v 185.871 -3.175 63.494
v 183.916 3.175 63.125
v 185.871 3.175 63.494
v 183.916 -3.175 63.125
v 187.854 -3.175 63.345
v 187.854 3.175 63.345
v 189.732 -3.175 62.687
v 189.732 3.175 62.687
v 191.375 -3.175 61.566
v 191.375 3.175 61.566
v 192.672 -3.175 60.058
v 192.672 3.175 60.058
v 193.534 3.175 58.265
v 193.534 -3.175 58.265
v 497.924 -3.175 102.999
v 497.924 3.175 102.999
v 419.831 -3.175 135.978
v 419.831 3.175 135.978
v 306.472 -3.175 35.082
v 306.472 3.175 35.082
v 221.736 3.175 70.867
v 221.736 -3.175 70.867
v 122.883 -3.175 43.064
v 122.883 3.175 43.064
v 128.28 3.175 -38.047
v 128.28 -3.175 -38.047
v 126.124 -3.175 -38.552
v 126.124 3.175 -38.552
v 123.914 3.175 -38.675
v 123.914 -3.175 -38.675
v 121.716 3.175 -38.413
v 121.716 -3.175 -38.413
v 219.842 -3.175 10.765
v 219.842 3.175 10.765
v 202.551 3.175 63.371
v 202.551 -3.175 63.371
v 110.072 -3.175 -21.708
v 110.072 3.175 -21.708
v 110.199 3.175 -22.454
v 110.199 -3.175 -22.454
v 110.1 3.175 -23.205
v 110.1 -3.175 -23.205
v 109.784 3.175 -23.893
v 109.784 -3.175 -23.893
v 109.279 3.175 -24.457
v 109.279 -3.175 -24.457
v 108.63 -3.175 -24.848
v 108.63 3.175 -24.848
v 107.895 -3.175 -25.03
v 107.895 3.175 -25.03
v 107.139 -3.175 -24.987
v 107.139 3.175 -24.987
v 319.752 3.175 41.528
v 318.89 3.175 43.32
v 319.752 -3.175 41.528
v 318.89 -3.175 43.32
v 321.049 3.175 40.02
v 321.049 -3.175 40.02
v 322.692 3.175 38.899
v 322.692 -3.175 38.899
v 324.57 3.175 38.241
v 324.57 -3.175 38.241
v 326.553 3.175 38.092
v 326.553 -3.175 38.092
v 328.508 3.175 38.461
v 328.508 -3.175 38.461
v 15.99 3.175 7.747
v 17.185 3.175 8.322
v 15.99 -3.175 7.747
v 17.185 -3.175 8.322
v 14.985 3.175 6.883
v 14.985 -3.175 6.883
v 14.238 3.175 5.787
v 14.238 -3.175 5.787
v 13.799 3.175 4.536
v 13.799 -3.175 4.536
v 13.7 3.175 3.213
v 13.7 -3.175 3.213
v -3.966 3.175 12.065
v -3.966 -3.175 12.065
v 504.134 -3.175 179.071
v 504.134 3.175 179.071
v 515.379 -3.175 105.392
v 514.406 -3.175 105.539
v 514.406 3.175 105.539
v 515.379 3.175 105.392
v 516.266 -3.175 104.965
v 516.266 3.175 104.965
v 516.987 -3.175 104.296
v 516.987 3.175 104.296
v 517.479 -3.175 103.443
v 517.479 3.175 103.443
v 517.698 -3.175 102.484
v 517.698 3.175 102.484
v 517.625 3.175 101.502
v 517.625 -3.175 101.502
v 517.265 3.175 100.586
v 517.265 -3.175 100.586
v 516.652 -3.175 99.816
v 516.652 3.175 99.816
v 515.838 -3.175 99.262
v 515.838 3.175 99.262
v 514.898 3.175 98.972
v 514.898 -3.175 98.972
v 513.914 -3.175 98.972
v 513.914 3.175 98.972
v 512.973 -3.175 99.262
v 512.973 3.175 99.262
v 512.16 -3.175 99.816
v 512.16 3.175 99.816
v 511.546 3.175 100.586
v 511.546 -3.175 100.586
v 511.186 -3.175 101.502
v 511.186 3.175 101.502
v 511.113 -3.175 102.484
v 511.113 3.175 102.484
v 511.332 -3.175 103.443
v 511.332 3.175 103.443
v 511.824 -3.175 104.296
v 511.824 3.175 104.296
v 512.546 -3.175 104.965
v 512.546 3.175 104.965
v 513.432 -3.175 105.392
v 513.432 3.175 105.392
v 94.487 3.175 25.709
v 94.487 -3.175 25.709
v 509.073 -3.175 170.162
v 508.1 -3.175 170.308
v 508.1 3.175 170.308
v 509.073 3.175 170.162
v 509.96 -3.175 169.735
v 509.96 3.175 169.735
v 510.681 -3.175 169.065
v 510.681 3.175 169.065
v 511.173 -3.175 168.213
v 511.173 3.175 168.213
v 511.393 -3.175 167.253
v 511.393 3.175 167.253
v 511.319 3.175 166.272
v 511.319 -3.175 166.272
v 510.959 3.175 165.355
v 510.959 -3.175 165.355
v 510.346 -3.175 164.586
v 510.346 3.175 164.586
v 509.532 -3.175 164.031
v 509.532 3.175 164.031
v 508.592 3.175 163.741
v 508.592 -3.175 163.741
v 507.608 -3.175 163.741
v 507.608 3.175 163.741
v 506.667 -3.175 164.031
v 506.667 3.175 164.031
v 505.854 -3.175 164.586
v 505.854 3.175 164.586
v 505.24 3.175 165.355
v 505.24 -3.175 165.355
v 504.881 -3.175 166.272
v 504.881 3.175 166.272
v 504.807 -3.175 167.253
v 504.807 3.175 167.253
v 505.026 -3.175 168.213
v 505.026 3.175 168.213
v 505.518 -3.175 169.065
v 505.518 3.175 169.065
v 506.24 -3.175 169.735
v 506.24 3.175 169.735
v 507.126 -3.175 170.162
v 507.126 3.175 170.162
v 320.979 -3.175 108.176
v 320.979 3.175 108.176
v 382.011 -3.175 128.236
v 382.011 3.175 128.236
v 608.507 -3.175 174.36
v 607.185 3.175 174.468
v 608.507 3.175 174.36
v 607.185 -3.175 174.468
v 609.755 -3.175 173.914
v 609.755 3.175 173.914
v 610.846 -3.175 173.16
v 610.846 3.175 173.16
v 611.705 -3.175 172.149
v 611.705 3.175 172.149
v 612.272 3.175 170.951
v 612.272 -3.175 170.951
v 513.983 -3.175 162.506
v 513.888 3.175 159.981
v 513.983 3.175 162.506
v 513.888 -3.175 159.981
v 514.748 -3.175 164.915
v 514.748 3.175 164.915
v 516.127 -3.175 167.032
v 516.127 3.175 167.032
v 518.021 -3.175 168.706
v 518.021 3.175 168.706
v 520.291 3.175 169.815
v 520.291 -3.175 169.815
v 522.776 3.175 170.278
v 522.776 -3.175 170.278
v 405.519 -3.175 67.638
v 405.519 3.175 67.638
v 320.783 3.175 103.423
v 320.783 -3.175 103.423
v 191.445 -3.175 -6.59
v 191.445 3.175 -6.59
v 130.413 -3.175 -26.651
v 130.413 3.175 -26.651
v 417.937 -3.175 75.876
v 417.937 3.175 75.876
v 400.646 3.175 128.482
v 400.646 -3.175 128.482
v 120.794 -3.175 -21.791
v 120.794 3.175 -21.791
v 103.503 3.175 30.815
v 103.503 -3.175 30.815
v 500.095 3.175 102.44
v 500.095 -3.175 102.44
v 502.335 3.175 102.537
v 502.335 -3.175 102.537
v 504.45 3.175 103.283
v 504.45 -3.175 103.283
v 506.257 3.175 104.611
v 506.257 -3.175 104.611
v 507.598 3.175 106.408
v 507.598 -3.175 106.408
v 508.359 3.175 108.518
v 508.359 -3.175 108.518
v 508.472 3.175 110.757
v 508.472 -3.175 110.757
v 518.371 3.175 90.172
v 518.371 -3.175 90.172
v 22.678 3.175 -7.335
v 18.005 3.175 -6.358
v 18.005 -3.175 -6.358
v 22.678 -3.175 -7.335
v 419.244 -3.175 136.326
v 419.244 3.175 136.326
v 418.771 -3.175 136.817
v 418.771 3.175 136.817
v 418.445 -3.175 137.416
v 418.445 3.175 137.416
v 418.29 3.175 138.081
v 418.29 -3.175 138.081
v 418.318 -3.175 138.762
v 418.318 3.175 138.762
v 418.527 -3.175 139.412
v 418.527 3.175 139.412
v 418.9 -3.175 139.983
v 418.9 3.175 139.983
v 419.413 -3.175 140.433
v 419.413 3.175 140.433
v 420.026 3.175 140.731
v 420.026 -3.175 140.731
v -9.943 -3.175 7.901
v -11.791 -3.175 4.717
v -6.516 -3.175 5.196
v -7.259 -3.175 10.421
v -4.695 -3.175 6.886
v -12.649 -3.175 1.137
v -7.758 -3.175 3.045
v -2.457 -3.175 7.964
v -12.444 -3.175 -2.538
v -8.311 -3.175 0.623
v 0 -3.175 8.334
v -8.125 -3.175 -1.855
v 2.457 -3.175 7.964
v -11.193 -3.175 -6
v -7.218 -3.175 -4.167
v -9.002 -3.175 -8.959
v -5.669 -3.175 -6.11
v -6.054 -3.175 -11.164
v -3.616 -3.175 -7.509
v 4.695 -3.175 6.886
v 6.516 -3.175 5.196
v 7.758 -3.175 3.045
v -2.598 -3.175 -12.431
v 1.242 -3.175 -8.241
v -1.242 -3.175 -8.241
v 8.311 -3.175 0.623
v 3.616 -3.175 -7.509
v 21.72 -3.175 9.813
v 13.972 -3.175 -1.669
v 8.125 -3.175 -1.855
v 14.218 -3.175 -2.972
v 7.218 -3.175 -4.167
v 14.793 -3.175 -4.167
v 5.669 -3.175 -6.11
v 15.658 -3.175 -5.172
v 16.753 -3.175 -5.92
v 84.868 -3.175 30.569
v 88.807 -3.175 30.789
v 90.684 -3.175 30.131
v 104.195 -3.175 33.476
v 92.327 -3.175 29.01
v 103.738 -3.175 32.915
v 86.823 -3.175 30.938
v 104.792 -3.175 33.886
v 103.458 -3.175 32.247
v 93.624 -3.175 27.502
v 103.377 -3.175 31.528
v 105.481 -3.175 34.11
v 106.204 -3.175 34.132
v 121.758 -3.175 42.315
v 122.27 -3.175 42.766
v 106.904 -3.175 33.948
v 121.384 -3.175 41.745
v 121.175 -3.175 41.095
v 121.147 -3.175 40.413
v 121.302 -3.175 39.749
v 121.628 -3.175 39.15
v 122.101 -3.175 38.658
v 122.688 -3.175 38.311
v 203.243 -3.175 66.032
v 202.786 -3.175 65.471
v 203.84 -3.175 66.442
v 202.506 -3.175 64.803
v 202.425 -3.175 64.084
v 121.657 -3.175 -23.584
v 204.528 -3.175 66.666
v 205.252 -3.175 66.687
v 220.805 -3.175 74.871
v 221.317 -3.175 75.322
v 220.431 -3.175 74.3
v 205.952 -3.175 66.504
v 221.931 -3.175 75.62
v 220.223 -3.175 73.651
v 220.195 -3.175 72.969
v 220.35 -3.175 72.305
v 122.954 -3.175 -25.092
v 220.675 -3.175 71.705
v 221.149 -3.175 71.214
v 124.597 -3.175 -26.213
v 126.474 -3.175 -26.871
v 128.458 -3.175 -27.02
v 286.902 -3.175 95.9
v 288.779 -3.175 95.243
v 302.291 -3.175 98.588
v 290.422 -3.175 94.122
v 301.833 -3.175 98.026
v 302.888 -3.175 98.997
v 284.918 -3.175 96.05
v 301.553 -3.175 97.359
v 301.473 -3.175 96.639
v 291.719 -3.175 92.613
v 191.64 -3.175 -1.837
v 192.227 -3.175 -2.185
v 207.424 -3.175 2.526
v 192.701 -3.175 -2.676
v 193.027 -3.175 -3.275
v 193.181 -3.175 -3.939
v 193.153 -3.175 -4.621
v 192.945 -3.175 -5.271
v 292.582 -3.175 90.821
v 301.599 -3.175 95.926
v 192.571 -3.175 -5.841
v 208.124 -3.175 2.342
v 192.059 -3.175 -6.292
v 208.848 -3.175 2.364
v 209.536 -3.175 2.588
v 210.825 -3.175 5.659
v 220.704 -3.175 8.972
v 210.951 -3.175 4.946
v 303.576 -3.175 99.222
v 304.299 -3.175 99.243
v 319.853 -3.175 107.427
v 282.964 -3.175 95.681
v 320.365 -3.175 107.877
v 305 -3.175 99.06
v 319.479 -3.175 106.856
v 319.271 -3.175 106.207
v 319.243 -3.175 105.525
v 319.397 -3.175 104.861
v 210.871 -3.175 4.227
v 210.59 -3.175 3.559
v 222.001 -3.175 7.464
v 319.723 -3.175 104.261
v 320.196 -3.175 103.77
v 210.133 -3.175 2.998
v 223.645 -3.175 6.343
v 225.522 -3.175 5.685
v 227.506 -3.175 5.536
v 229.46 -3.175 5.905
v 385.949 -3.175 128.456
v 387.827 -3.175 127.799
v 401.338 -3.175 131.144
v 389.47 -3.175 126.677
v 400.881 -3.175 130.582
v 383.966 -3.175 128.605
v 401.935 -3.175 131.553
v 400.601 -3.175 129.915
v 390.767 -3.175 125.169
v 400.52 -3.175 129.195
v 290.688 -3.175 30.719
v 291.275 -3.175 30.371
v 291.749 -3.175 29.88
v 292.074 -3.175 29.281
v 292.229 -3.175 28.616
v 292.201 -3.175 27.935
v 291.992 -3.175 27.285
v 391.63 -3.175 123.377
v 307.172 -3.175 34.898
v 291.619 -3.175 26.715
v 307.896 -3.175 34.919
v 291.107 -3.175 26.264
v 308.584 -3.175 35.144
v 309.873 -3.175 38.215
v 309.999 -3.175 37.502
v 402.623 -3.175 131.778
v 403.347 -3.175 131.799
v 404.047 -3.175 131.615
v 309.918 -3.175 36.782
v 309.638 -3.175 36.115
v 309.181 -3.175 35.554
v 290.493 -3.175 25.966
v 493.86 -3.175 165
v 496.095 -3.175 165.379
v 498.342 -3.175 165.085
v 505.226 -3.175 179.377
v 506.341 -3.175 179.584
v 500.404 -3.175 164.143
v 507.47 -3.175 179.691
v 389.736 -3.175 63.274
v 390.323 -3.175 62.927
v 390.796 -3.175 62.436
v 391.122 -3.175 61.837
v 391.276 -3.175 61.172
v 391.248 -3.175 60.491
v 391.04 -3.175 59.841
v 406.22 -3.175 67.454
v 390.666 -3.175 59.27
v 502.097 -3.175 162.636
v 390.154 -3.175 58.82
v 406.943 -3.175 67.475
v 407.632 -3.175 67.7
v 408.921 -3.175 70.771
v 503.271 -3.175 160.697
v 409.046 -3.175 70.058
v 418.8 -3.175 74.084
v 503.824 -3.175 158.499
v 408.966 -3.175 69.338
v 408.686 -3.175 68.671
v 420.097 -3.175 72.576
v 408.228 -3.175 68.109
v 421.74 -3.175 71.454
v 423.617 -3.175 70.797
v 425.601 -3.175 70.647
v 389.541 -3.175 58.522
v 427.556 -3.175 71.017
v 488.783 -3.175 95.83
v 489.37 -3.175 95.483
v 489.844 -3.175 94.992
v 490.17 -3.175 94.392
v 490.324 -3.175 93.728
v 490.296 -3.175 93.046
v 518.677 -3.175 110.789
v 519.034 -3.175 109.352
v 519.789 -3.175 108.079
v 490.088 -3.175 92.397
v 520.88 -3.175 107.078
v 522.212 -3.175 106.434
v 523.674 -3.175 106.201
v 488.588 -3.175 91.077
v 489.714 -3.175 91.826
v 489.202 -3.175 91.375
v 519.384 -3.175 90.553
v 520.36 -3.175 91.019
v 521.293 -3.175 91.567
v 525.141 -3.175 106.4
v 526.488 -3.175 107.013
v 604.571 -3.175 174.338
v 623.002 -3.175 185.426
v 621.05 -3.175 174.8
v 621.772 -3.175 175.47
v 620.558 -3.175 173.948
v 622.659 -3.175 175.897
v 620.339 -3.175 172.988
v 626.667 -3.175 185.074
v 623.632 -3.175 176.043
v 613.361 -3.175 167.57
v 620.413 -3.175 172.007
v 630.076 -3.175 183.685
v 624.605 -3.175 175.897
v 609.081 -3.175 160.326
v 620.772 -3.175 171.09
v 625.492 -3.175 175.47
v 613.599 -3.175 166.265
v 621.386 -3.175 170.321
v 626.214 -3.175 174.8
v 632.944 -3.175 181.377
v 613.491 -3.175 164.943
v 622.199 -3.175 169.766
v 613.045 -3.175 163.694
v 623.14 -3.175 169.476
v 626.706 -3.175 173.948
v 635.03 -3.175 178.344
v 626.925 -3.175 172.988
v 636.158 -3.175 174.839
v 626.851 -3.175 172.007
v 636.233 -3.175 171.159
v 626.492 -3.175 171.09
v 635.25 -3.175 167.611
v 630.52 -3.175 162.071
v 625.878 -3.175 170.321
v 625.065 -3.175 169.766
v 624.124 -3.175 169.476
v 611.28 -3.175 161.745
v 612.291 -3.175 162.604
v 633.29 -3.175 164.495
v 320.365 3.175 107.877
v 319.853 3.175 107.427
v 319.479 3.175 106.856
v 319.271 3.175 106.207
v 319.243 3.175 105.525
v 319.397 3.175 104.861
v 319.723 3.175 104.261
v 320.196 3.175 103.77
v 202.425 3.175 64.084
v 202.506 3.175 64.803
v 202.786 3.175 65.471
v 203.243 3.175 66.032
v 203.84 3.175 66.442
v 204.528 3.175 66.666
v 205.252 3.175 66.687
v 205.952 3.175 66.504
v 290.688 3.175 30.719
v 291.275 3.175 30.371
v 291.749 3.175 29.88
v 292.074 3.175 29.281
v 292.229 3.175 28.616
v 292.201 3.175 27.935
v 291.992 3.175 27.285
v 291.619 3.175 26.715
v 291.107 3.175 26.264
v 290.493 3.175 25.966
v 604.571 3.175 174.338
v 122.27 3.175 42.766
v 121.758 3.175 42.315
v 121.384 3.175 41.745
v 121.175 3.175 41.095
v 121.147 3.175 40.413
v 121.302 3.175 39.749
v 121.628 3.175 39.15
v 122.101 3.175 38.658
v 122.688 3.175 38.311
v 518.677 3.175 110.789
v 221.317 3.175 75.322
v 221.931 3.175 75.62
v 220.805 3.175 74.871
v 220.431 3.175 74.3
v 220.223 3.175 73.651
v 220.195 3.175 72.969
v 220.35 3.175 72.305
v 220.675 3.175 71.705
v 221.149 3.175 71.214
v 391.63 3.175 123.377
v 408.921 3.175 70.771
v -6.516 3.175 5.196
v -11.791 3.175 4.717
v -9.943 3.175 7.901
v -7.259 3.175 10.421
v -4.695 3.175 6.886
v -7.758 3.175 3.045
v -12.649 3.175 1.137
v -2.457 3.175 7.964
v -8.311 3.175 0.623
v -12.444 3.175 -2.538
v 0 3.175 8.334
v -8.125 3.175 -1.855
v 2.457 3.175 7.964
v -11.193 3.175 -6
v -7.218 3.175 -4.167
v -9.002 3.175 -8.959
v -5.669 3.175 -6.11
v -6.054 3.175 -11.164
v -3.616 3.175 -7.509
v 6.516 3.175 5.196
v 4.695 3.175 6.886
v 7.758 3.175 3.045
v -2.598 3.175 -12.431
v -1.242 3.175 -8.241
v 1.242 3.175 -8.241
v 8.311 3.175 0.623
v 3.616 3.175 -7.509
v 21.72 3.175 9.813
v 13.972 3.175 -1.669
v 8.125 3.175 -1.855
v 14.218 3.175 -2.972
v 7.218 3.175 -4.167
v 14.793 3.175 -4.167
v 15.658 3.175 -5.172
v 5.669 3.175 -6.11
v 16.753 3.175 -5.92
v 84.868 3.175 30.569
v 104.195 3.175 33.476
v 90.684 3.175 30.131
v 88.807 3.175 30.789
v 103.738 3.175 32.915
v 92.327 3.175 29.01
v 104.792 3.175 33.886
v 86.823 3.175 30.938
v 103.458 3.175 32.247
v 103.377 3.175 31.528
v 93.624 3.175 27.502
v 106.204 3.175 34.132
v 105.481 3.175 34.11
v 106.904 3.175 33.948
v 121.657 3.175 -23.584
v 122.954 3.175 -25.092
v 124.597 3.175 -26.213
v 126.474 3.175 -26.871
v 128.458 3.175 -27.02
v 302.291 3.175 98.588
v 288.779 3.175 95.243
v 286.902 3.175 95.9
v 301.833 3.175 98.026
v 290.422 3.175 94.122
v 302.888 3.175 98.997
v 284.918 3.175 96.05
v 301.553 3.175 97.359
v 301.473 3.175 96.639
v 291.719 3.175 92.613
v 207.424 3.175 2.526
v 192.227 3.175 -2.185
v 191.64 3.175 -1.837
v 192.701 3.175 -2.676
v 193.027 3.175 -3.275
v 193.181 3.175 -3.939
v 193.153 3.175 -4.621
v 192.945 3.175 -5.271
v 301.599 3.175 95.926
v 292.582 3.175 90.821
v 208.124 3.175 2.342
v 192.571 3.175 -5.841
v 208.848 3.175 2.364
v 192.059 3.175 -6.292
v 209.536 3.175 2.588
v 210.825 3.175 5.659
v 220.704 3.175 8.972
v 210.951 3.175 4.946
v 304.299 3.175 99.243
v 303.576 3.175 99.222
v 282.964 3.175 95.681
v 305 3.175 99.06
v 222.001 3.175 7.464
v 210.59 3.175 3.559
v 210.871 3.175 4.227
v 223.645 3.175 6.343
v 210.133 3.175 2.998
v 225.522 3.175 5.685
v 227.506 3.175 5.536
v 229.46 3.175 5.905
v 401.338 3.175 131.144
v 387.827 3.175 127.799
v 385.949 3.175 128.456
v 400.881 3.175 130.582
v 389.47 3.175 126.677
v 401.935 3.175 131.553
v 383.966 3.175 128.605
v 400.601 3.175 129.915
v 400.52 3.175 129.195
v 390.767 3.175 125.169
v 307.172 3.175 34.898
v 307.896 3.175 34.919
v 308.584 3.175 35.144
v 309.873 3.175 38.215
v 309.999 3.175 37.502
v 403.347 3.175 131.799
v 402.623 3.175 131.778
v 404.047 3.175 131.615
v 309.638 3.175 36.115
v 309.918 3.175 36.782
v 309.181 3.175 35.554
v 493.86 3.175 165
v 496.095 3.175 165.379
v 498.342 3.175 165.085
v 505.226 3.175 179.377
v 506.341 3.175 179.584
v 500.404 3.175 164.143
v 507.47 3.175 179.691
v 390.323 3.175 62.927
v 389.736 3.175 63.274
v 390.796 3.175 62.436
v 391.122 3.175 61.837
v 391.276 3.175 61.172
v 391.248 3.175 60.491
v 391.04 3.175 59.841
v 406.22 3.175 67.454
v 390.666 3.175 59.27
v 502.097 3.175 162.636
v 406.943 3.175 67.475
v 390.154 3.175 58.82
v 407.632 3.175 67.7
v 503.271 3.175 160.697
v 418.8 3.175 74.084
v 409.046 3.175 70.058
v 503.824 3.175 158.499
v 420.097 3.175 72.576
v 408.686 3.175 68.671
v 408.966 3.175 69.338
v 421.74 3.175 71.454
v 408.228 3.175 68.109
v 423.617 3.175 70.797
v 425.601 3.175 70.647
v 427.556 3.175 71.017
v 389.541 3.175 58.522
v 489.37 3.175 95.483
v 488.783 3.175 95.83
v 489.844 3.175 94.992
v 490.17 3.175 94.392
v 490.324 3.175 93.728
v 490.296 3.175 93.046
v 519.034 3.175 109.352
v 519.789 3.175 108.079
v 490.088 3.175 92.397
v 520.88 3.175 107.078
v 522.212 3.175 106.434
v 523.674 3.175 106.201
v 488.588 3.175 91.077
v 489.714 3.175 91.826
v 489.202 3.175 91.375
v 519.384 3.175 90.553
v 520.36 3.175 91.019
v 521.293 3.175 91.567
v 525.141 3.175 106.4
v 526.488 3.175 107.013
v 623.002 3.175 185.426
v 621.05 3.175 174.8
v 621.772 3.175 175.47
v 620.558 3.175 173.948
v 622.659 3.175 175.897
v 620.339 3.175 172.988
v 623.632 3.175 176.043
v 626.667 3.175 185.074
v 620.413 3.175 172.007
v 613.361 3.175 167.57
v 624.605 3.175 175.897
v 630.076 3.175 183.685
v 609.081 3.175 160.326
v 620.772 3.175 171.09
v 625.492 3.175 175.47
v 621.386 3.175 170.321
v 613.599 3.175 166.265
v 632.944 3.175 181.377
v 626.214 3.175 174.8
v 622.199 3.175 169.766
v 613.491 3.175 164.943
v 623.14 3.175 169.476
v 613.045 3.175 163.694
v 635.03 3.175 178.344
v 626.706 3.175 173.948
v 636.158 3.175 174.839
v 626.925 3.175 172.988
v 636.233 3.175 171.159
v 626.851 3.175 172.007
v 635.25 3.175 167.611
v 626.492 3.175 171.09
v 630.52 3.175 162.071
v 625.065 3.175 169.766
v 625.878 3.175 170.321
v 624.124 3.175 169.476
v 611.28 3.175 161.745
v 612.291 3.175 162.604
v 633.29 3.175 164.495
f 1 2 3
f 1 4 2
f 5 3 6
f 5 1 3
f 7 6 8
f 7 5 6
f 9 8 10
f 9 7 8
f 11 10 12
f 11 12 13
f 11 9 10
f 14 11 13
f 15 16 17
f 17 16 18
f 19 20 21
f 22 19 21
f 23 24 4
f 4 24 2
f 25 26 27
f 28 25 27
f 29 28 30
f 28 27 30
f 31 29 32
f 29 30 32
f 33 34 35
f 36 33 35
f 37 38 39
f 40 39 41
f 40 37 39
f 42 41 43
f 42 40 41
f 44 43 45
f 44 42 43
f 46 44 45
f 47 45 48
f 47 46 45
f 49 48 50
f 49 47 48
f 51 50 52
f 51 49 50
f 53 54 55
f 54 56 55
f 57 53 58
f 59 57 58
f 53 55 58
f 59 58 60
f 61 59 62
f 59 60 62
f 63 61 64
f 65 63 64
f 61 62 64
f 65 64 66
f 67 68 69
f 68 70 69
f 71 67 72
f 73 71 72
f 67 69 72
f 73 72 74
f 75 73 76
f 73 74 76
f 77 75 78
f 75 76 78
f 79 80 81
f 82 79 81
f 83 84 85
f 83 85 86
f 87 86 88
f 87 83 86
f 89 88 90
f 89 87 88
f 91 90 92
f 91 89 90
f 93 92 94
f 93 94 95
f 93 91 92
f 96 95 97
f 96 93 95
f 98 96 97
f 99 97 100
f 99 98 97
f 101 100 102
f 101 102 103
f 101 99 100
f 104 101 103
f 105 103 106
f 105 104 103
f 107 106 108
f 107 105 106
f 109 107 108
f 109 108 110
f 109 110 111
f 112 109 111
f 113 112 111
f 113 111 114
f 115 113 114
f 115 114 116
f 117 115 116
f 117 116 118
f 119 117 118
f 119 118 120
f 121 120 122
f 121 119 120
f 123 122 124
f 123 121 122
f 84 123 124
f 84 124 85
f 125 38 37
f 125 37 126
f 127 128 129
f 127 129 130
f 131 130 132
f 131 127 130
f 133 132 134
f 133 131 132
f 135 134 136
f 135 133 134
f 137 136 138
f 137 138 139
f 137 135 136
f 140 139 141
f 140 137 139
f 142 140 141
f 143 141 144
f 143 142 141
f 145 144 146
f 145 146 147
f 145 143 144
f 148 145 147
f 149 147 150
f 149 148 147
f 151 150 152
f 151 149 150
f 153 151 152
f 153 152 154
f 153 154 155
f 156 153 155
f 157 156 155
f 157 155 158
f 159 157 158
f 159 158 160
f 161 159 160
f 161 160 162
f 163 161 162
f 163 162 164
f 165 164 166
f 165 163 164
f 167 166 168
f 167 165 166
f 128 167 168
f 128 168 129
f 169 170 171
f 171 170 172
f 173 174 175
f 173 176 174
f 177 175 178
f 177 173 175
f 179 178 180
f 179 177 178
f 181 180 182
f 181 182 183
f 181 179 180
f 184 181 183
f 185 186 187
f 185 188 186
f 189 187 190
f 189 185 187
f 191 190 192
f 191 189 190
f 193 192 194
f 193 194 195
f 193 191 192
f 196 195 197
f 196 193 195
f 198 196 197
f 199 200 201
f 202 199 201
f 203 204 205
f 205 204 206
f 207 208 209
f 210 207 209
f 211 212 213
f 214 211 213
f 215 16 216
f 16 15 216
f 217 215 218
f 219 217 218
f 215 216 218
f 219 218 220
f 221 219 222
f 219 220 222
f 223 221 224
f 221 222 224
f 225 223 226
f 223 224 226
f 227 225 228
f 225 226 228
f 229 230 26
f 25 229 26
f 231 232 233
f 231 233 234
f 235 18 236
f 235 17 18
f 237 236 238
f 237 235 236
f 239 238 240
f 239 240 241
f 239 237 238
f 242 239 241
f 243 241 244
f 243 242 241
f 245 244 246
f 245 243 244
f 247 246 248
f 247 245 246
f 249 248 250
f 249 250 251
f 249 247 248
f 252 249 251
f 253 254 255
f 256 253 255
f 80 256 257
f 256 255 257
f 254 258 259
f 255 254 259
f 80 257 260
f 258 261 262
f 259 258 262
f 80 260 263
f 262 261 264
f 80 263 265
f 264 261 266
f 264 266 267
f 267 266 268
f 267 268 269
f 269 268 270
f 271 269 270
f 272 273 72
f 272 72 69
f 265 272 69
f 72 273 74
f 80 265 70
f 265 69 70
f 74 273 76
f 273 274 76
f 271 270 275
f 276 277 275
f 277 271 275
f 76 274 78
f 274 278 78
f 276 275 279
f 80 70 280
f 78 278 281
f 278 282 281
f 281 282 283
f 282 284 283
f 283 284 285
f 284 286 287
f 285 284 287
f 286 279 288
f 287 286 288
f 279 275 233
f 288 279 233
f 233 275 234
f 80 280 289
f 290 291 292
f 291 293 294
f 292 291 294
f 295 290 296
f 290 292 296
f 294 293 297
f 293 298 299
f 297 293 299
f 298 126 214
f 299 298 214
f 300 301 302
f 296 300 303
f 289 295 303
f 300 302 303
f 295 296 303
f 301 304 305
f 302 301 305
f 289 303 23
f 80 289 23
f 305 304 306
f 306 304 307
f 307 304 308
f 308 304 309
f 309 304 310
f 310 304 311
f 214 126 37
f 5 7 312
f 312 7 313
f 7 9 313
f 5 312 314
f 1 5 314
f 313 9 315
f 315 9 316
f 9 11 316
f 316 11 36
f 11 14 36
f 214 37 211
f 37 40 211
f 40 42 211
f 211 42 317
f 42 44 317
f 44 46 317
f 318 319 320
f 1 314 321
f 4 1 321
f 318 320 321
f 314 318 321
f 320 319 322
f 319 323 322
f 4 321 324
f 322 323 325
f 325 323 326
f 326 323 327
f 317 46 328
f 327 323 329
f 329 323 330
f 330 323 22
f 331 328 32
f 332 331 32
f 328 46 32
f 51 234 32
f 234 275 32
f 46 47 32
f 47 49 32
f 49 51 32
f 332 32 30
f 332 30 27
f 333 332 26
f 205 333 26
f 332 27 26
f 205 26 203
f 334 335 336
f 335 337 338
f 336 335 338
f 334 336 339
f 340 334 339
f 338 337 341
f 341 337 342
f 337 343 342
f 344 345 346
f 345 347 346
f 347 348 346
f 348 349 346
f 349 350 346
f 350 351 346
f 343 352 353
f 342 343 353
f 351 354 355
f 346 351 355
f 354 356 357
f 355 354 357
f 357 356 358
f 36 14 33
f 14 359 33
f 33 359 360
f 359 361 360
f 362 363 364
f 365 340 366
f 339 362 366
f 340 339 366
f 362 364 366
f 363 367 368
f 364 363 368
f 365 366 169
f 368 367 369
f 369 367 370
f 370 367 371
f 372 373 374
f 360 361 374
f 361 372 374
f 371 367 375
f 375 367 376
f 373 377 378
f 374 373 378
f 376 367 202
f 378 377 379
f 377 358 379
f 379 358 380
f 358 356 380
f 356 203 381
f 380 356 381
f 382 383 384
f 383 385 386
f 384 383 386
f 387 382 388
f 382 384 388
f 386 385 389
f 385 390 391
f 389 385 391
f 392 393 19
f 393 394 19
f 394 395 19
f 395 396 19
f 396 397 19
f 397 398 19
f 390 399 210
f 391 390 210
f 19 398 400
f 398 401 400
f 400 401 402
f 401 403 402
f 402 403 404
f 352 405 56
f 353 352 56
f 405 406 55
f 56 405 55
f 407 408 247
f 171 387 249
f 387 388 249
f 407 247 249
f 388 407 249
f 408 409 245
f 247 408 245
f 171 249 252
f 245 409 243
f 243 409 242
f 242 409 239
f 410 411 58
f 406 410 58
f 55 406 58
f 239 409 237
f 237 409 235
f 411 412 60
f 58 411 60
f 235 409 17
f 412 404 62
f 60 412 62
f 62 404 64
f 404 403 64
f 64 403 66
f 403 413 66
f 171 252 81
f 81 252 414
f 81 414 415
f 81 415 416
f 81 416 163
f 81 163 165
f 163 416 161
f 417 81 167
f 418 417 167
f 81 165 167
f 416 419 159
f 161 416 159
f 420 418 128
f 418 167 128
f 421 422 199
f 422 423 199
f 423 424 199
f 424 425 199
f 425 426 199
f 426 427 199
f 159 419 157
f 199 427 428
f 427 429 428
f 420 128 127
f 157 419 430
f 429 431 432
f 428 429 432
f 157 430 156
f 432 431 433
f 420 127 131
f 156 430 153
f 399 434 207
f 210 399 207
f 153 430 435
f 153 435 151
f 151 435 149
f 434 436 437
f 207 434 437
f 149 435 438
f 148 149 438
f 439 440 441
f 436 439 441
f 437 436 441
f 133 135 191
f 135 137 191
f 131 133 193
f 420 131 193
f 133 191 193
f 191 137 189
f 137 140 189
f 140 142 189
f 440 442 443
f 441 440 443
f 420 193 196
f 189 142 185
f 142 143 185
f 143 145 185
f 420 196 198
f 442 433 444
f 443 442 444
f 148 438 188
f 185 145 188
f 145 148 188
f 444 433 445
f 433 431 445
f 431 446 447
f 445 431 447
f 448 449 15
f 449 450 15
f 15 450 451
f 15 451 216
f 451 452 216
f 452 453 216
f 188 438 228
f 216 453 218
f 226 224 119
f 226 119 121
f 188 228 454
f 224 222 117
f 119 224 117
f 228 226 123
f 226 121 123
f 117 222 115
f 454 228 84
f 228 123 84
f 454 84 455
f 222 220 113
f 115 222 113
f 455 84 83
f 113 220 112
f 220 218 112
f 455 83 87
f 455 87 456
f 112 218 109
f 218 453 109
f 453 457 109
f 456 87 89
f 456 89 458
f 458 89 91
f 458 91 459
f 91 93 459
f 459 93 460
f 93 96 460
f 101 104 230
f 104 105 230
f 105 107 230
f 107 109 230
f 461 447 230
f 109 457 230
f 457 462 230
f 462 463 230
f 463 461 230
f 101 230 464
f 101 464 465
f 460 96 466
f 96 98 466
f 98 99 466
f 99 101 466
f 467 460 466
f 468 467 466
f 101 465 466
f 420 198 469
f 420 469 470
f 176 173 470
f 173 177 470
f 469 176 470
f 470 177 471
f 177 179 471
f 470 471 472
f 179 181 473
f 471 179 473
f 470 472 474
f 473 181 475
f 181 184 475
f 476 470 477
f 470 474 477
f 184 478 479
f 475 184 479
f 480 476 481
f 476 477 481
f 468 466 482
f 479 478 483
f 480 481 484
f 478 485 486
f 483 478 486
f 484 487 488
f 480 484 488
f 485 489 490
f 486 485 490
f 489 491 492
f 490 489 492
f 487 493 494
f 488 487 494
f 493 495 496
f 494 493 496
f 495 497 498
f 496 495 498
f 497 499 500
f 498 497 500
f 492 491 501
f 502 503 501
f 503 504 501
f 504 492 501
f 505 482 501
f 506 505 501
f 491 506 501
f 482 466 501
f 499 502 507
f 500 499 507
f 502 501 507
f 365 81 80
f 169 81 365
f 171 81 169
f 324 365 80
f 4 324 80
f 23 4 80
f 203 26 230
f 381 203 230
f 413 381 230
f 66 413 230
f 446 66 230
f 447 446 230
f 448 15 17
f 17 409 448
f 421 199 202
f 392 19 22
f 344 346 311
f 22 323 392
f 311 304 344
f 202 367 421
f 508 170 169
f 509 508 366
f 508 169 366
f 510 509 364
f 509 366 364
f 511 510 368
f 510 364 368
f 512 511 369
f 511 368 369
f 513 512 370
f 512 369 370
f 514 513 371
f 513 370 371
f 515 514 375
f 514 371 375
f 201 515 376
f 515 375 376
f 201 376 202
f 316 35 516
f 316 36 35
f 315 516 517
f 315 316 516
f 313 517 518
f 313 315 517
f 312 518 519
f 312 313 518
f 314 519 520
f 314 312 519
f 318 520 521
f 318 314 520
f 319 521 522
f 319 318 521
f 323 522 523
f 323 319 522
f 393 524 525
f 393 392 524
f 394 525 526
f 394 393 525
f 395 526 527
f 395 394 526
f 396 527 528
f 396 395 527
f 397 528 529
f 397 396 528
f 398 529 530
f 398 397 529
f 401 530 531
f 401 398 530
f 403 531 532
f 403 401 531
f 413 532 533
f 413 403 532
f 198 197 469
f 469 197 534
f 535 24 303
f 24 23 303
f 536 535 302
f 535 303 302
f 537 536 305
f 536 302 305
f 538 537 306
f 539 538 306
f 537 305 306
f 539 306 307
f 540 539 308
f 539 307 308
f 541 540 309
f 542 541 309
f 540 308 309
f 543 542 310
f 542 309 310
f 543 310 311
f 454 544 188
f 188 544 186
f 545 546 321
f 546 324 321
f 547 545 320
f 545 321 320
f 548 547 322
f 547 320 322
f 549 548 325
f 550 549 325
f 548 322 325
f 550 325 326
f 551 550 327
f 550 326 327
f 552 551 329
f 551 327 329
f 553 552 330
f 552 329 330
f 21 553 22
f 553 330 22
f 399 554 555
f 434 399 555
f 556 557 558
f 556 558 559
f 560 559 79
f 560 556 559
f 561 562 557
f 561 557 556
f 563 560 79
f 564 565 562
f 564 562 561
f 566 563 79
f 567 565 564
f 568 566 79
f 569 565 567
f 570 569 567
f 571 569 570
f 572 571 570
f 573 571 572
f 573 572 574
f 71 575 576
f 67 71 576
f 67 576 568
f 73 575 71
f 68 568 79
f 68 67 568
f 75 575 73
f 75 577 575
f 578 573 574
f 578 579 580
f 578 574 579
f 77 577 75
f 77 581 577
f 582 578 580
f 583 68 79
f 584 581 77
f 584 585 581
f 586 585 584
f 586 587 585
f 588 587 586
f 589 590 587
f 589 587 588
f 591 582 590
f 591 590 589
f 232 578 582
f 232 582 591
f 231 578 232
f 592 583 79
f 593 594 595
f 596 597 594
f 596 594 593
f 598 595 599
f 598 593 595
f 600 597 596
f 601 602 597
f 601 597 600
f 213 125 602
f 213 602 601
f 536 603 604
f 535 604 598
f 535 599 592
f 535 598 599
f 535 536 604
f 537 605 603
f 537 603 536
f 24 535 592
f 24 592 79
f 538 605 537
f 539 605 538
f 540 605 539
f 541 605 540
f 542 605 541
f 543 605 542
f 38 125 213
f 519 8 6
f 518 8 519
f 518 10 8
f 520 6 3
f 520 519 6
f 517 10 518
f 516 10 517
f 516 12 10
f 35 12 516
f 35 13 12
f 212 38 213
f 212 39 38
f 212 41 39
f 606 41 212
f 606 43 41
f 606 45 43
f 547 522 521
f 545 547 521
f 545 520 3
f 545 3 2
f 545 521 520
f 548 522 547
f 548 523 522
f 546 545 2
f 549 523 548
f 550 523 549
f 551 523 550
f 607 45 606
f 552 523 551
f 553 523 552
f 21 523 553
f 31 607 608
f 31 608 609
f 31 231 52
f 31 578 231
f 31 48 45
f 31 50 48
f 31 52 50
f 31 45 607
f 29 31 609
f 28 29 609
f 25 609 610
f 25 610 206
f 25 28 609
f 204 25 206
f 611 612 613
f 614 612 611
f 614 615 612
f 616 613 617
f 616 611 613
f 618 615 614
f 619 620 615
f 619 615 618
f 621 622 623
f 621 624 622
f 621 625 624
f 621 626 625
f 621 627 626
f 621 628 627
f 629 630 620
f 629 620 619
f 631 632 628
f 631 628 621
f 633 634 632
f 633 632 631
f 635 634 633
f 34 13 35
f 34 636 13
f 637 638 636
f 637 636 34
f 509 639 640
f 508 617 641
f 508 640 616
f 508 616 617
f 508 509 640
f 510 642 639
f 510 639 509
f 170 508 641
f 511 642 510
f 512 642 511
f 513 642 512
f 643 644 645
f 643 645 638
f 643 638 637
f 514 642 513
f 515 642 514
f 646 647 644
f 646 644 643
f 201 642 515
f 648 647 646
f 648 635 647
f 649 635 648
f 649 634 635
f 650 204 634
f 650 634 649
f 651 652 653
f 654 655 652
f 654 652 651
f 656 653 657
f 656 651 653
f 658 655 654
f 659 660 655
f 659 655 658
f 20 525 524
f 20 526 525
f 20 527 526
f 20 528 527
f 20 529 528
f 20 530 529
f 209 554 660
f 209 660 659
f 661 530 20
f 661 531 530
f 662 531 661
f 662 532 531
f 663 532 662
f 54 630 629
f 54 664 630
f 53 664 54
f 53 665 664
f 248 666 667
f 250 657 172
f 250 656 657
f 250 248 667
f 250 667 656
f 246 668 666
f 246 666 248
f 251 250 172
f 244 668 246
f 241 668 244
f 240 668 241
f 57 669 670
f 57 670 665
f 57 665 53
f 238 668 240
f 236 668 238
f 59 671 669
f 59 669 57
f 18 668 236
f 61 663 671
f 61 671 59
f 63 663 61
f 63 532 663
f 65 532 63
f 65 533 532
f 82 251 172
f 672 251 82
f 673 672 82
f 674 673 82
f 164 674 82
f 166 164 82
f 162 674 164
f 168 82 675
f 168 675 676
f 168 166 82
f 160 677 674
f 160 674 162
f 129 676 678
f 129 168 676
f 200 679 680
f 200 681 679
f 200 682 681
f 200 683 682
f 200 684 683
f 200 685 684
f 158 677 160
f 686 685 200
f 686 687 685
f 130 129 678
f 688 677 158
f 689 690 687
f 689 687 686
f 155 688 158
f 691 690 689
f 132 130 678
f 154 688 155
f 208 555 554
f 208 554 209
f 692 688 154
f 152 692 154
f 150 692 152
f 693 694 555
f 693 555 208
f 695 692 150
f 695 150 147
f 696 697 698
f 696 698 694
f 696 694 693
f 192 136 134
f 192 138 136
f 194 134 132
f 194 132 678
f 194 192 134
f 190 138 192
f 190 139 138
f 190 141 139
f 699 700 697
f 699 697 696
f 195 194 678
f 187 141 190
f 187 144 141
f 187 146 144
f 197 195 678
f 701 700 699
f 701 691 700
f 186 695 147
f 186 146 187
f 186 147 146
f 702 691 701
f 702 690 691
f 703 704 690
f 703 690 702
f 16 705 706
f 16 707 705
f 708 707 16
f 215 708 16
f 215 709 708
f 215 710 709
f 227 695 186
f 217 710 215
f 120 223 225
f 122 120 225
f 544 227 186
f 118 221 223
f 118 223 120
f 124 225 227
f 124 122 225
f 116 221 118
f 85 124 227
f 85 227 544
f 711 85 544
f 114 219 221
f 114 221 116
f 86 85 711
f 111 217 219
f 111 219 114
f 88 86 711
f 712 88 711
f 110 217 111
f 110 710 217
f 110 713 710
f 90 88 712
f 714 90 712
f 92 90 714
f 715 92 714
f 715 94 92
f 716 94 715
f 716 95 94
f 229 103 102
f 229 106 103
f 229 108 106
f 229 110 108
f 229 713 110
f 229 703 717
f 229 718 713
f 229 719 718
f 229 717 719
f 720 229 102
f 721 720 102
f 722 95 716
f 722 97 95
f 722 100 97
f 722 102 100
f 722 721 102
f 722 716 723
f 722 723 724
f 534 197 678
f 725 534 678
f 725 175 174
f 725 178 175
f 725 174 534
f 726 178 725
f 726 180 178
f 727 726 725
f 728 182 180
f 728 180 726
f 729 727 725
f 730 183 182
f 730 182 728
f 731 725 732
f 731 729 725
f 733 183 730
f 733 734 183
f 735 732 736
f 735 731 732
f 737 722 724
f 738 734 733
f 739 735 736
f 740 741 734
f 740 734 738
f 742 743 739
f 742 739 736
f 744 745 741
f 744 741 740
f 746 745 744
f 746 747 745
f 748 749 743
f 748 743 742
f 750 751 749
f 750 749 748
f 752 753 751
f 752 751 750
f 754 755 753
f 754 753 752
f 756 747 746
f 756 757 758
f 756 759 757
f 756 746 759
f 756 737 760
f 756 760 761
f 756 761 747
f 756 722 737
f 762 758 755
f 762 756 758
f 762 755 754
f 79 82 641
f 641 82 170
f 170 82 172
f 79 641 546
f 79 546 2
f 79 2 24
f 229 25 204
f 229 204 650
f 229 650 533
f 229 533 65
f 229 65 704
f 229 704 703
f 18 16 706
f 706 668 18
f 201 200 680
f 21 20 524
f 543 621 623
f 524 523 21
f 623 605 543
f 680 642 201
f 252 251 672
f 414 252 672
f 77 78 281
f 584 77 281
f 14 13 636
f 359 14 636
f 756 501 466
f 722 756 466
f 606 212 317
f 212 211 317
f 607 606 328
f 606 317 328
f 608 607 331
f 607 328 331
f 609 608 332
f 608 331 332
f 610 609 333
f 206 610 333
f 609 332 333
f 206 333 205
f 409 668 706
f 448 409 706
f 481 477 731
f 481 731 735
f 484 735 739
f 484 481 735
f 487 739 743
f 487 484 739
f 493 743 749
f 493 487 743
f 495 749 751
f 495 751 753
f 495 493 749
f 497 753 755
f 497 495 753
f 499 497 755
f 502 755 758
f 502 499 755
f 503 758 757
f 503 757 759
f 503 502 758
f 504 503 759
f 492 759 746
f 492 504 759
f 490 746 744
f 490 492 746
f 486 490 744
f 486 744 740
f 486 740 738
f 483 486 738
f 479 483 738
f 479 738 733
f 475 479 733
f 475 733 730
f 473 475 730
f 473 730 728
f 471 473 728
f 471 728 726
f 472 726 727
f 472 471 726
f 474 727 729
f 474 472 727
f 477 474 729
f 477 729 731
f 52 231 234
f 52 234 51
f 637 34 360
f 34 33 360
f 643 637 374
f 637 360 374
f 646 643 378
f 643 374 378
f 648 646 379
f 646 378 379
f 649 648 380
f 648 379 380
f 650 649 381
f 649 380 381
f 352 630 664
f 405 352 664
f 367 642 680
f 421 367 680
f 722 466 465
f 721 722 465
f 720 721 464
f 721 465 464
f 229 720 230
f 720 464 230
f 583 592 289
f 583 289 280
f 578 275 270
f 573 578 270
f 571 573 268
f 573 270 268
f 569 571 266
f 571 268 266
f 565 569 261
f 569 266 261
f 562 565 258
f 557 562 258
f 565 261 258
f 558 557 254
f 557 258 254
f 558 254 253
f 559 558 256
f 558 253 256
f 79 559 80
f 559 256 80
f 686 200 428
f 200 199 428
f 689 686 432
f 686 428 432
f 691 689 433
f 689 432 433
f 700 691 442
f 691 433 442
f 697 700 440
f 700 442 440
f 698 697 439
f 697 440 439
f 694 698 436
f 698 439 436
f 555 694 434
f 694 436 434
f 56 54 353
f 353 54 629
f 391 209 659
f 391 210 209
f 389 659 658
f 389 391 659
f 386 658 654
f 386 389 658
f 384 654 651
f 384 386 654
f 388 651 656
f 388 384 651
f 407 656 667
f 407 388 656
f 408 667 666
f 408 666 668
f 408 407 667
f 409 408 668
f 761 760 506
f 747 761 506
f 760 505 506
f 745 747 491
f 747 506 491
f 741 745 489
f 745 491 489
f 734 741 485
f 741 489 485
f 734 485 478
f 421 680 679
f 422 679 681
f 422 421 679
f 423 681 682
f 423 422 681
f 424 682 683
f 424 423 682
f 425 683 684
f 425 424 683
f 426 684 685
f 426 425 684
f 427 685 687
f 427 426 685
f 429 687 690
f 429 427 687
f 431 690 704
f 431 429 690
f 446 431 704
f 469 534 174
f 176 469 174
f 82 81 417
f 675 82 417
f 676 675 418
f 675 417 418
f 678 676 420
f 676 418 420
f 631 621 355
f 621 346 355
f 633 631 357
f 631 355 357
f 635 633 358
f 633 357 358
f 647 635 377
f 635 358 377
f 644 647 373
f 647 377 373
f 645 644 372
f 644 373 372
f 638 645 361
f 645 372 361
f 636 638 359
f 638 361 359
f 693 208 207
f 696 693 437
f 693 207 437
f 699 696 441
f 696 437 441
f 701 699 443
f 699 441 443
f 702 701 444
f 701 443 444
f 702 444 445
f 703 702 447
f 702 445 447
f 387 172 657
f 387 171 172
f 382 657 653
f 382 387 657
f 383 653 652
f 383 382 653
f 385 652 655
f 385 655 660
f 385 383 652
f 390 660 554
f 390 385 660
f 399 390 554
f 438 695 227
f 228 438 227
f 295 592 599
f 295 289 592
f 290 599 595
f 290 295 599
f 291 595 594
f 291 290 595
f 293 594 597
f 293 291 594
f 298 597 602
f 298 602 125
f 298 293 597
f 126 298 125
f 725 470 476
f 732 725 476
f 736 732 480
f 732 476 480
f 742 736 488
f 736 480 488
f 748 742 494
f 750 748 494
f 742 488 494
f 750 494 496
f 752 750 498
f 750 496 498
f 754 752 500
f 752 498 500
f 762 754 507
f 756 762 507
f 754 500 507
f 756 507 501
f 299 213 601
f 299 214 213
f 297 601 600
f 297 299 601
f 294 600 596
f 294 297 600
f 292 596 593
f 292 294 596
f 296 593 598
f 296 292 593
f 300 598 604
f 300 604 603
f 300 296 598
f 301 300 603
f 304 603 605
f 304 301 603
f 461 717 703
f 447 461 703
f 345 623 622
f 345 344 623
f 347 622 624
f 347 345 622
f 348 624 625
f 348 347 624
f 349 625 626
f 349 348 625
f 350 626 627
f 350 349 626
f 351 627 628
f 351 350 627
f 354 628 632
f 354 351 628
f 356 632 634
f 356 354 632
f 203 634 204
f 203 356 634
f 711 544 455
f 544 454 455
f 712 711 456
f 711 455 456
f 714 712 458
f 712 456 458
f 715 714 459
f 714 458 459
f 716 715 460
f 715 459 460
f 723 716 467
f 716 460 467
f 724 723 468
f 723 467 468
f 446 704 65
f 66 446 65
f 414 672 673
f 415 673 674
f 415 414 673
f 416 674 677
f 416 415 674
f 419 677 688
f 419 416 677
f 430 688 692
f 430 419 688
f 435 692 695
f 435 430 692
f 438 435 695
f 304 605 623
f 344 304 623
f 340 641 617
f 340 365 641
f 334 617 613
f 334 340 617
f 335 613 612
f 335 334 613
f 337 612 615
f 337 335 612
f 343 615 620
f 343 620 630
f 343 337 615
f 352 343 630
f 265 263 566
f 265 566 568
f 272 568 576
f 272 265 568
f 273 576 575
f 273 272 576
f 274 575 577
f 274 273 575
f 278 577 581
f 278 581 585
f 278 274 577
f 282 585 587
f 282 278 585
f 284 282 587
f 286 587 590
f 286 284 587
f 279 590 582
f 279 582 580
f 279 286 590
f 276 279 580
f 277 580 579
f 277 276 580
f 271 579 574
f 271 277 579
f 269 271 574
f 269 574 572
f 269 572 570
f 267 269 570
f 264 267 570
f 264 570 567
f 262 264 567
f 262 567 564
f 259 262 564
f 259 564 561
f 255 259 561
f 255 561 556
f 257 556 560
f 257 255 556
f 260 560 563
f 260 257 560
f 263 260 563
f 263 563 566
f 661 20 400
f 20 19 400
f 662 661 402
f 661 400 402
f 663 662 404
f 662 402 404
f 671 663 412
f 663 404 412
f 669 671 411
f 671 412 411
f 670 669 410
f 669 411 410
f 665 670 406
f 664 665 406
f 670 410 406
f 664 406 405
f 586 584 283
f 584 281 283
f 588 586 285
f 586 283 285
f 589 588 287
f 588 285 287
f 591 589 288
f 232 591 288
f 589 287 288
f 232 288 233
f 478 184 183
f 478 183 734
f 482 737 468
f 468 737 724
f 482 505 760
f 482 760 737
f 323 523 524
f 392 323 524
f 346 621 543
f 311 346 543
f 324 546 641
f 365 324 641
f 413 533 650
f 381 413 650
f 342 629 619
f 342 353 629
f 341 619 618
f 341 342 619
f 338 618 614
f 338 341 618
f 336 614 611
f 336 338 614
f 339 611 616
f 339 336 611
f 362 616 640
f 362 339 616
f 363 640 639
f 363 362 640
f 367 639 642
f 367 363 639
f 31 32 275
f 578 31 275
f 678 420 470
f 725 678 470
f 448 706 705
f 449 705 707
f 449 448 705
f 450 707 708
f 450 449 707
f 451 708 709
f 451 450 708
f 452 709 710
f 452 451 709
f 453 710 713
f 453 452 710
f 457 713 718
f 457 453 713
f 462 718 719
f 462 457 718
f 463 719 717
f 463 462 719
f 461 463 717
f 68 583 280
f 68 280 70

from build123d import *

# Parameters (mm, degrees)
BOSS_EXTRUDE1_DEPTH      = 3.175
BOSS_EXTRUDE1_DEPTH_BACK = 3.175
SKETCH2_R                = 8.334375
SKETCH2_R_2              = 3.302
CUT_EXTRUDE1_DEPTH       = 663.832858032
RIGHT_ANGLES_R           = 7.62
FILLET9_R                = 9.398
FILLET10_R               = 7.62
FILLET11_R               = 5.08
FILLET13_R               = 5.08
FILLET14_R               = 2.54


with BuildPart() as part:
    # Sketch2 → Boss-Extrude1 (new, two sides: drawn at the far end of the back side and taken through both)
    with BuildSketch(Plane(origin=(0, 0, 0), x_dir=(1, 0, 0), z_dir=(0, 1, 0)).offset(-BOSS_EXTRUDE1_DEPTH_BACK)):
        with BuildLine():
            Line((-3.965619751, -12.064984873), (504.134113458, -179.071438566))
            ThreePointArc((504.134113458, -179.071438566), (505.781320473, -179.493044996), (507.470083881, -179.690835496))
            Line((507.470083881, -179.690835496), (623.002452599, -185.425831444))
            ThreePointArc((623.002452599, -185.425831444), (635.721308663, -176.632603773), (630.519585141, -162.071277432))
            Line((630.519585141, -162.071277432), (521.293179876, -91.566789023))
            ThreePointArc((521.293179876, -91.566789023), (519.876879037, -90.77588958), (518.371316412, -90.171976358))
            Line((518.371316412, -90.171976358), (128.279552471, 38.046634777))
            ThreePointArc((128.279552471, 38.046634777), (125.021779391, 38.661908304), (121.715767729, 38.413043176))
            Line((121.715767729, 38.413043176), (-2.59816499, 12.431393272))
            ThreePointArc((-2.59816499, 12.431393272), (-12.6802584, 0.707846671), (-3.965619751, -12.064984873))
        make_face()
        Circle(SKETCH2_R, mode=Mode.SUBTRACT)
        with Locations((623.632101926, -172.741449641)):
            Circle(SKETCH2_R_2, mode=Mode.SUBTRACT)
        with Locations((508.099733209, -167.006453693)):
            Circle(SKETCH2_R_2, mode=Mode.SUBTRACT)
        with Locations((514.405696661, -102.236961232)):
            Circle(SKETCH2_R_2, mode=Mode.SUBTRACT)
    extrude(amount=BOSS_EXTRUDE1_DEPTH + BOSS_EXTRUDE1_DEPTH_BACK)

    # Sketch4 → Cut-Extrude1 (cut, through all)
    with BuildSketch(Plane(origin=(0, 3.175, 0), x_dir=(1, 0, 0), z_dir=(0, 1, 0))):
        Polygon((123.173594128, 29.030153456), (101.759247472, -36.120764859), (197.883708709, 4.473810527), align=None)
        Polygon((212.569250905, -0.353155839), (116.444789668, -40.947731225), (191.154904249, -65.504074154), align=None)
        Polygon((222.221238803, -3.52565164), (200.806892147, -68.676569955), (296.931353384, -28.08199457), align=None)
        Polygon((311.61689558, -32.908960935), (215.492434343, -73.503536321), (290.202548924, -98.059879251), align=None)
        Polygon((321.268883479, -36.081456736), (299.854536823, -101.232375051), (395.97899806, -60.637799666), align=None)
        Polygon((410.664540256, -65.464766032), (314.540079019, -106.059341417), (389.2501936, -130.615684347), align=None)
        Polygon((519.484855658, -102.492310656), (512.932796085, -169.789493129), (604.57066912, -174.338372689), (611.078066813, -174.661398174), (614.555007617, -163.859087404), (609.080948645, -160.325640282), align=None)
        Polygon((509.712184931, -98.020571128), (413.587723694, -138.615146514), (502.901744402, -167.971622986), align=None)
        Polygon((420.316528154, -68.637261833), (398.902181498, -133.788180148), (495.026642735, -93.193604762), align=None)
        Polygon((22.677662652, 7.33452053), (111.445751733, 25.887078258), (92.107259573, -32.948269058), (21.720444319, -9.812944172), (13.482358668, -7.105181542), (14.189389884, 5.560468929), align=None)
    extrude(amount=-CUT_EXTRUDE1_DEPTH, mode=Mode.SUBTRACT)

    # right angles
    right_angles_edges = [part.edges().sort_by_distance(p)[0] for p in [
        (420.316528154, 0, 68.637261833),
        (321.268883479, 0, 36.081456736),
        (389.2501936, 0, 130.615684347),
        (502.901744402, 0, 167.971622986),
        (290.202548924, 0, 98.059879251),
        (222.221238803, 0, 3.52565164),
        (191.154904249, 0, 65.504074154),
        (123.173594128, 0, -29.030153456),
        (92.107259573, 0, 32.948269058),
    ]]
    fillet(right_angles_edges, radius=RIGHT_ANGLES_R)

    # Fillet9
    fillet9_edges = [part.edges().sort_by_distance(p)[0] for p in [
        (512.932796085, 0, 169.789493129),
    ]]
    fillet(fillet9_edges, radius=FILLET9_R)

    # Fillet10
    fillet10_edges = [part.edges().sort_by_distance(p)[0] for p in [
        (509.712184931, 0, 98.020571128),
    ]]
    fillet(fillet10_edges, radius=FILLET10_R)

    # Fillet11
    fillet11_edges = [part.edges().sort_by_distance(p)[0] for p in [
        (519.484855658, 0, 102.492310656),
    ]]
    fillet(fillet11_edges, radius=FILLET11_R)

    # Fillet13
    fillet13_edges = [part.edges().sort_by_distance(p)[0] for p in [
        (614.555007617, 0, 163.859087404),
        (611.078066813, 0, 174.661398174),
        (13.482358668, 0, 7.105181542),
        (14.189389884, 0, -5.560468929),
    ]]
    fillet(fillet13_edges, radius=FILLET13_R)

    # Fillet14
    fillet14_edges = [part.edges().sort_by_distance(p)[0] for p in [
        (410.664540256, 0, 65.464766032),
        (311.61689558, 0, 32.908960935),
        (413.587723694, 0, 138.615146514),
        (215.492434343, 0, 73.503536321),
        (314.540079019, 0, 106.059341417),
        (398.902181498, 0, 133.788180148),
        (299.854536823, 0, 101.232375051),
        (200.806892147, 0, 68.676569955),
        (212.569250905, 0, 0.353155839),
        (101.759247472, 0, 36.120764859),
        (116.444789668, 0, 40.947731225),
        (495.026642735, 0, 93.193604762),
        (395.97899806, 0, 60.637799666),
        (296.931353384, 0, 28.08199457),
        (197.883708709, 0, -4.473810527),
        (111.445751733, 0, -25.887078258),
    ]]
    fillet(fillet14_edges, radius=FILLET14_R)


solid = part.part
